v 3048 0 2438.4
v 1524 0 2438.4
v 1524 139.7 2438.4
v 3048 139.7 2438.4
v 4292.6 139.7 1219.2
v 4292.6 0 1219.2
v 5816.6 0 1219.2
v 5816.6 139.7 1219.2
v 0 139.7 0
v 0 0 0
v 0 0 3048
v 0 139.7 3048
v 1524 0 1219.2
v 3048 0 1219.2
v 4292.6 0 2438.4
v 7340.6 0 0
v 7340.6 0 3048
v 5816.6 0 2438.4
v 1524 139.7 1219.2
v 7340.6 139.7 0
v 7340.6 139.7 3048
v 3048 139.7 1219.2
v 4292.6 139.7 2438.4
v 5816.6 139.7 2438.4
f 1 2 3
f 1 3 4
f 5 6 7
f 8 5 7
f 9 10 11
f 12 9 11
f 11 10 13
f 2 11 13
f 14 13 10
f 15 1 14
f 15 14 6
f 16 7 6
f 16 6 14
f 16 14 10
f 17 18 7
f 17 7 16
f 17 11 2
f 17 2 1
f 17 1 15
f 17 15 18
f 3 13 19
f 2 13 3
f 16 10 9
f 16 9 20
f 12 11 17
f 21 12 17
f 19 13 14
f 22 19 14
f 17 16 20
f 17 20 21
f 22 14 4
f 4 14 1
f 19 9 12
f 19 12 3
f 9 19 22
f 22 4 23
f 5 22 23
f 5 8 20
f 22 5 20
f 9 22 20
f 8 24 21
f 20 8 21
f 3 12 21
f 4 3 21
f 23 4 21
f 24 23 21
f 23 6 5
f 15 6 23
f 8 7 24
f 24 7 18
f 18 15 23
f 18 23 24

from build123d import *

# Parameters (mm, degrees)
F0_W     = 7340.6
F0_H     = 3048
F0_W_2   = 1524
F0_H_2   = 1219.2
F1_DEPTH = 139.7


with BuildPart() as f1:
    # F0 (on Front) → F1 (new body)
    with BuildSketch(Plane.XZ):
        with Locations((3670.3, 1524)):
            Rectangle(F0_W, F0_H)
        with Locations((2286, 1828.8)):
            Rectangle(F0_W_2, F0_H_2, mode=Mode.SUBTRACT)
        with Locations((5054.6, 1828.8)):
            Rectangle(F0_W_2, F0_H_2, mode=Mode.SUBTRACT)
    extrude(amount=-F1_DEPTH)


solid = f1.part
